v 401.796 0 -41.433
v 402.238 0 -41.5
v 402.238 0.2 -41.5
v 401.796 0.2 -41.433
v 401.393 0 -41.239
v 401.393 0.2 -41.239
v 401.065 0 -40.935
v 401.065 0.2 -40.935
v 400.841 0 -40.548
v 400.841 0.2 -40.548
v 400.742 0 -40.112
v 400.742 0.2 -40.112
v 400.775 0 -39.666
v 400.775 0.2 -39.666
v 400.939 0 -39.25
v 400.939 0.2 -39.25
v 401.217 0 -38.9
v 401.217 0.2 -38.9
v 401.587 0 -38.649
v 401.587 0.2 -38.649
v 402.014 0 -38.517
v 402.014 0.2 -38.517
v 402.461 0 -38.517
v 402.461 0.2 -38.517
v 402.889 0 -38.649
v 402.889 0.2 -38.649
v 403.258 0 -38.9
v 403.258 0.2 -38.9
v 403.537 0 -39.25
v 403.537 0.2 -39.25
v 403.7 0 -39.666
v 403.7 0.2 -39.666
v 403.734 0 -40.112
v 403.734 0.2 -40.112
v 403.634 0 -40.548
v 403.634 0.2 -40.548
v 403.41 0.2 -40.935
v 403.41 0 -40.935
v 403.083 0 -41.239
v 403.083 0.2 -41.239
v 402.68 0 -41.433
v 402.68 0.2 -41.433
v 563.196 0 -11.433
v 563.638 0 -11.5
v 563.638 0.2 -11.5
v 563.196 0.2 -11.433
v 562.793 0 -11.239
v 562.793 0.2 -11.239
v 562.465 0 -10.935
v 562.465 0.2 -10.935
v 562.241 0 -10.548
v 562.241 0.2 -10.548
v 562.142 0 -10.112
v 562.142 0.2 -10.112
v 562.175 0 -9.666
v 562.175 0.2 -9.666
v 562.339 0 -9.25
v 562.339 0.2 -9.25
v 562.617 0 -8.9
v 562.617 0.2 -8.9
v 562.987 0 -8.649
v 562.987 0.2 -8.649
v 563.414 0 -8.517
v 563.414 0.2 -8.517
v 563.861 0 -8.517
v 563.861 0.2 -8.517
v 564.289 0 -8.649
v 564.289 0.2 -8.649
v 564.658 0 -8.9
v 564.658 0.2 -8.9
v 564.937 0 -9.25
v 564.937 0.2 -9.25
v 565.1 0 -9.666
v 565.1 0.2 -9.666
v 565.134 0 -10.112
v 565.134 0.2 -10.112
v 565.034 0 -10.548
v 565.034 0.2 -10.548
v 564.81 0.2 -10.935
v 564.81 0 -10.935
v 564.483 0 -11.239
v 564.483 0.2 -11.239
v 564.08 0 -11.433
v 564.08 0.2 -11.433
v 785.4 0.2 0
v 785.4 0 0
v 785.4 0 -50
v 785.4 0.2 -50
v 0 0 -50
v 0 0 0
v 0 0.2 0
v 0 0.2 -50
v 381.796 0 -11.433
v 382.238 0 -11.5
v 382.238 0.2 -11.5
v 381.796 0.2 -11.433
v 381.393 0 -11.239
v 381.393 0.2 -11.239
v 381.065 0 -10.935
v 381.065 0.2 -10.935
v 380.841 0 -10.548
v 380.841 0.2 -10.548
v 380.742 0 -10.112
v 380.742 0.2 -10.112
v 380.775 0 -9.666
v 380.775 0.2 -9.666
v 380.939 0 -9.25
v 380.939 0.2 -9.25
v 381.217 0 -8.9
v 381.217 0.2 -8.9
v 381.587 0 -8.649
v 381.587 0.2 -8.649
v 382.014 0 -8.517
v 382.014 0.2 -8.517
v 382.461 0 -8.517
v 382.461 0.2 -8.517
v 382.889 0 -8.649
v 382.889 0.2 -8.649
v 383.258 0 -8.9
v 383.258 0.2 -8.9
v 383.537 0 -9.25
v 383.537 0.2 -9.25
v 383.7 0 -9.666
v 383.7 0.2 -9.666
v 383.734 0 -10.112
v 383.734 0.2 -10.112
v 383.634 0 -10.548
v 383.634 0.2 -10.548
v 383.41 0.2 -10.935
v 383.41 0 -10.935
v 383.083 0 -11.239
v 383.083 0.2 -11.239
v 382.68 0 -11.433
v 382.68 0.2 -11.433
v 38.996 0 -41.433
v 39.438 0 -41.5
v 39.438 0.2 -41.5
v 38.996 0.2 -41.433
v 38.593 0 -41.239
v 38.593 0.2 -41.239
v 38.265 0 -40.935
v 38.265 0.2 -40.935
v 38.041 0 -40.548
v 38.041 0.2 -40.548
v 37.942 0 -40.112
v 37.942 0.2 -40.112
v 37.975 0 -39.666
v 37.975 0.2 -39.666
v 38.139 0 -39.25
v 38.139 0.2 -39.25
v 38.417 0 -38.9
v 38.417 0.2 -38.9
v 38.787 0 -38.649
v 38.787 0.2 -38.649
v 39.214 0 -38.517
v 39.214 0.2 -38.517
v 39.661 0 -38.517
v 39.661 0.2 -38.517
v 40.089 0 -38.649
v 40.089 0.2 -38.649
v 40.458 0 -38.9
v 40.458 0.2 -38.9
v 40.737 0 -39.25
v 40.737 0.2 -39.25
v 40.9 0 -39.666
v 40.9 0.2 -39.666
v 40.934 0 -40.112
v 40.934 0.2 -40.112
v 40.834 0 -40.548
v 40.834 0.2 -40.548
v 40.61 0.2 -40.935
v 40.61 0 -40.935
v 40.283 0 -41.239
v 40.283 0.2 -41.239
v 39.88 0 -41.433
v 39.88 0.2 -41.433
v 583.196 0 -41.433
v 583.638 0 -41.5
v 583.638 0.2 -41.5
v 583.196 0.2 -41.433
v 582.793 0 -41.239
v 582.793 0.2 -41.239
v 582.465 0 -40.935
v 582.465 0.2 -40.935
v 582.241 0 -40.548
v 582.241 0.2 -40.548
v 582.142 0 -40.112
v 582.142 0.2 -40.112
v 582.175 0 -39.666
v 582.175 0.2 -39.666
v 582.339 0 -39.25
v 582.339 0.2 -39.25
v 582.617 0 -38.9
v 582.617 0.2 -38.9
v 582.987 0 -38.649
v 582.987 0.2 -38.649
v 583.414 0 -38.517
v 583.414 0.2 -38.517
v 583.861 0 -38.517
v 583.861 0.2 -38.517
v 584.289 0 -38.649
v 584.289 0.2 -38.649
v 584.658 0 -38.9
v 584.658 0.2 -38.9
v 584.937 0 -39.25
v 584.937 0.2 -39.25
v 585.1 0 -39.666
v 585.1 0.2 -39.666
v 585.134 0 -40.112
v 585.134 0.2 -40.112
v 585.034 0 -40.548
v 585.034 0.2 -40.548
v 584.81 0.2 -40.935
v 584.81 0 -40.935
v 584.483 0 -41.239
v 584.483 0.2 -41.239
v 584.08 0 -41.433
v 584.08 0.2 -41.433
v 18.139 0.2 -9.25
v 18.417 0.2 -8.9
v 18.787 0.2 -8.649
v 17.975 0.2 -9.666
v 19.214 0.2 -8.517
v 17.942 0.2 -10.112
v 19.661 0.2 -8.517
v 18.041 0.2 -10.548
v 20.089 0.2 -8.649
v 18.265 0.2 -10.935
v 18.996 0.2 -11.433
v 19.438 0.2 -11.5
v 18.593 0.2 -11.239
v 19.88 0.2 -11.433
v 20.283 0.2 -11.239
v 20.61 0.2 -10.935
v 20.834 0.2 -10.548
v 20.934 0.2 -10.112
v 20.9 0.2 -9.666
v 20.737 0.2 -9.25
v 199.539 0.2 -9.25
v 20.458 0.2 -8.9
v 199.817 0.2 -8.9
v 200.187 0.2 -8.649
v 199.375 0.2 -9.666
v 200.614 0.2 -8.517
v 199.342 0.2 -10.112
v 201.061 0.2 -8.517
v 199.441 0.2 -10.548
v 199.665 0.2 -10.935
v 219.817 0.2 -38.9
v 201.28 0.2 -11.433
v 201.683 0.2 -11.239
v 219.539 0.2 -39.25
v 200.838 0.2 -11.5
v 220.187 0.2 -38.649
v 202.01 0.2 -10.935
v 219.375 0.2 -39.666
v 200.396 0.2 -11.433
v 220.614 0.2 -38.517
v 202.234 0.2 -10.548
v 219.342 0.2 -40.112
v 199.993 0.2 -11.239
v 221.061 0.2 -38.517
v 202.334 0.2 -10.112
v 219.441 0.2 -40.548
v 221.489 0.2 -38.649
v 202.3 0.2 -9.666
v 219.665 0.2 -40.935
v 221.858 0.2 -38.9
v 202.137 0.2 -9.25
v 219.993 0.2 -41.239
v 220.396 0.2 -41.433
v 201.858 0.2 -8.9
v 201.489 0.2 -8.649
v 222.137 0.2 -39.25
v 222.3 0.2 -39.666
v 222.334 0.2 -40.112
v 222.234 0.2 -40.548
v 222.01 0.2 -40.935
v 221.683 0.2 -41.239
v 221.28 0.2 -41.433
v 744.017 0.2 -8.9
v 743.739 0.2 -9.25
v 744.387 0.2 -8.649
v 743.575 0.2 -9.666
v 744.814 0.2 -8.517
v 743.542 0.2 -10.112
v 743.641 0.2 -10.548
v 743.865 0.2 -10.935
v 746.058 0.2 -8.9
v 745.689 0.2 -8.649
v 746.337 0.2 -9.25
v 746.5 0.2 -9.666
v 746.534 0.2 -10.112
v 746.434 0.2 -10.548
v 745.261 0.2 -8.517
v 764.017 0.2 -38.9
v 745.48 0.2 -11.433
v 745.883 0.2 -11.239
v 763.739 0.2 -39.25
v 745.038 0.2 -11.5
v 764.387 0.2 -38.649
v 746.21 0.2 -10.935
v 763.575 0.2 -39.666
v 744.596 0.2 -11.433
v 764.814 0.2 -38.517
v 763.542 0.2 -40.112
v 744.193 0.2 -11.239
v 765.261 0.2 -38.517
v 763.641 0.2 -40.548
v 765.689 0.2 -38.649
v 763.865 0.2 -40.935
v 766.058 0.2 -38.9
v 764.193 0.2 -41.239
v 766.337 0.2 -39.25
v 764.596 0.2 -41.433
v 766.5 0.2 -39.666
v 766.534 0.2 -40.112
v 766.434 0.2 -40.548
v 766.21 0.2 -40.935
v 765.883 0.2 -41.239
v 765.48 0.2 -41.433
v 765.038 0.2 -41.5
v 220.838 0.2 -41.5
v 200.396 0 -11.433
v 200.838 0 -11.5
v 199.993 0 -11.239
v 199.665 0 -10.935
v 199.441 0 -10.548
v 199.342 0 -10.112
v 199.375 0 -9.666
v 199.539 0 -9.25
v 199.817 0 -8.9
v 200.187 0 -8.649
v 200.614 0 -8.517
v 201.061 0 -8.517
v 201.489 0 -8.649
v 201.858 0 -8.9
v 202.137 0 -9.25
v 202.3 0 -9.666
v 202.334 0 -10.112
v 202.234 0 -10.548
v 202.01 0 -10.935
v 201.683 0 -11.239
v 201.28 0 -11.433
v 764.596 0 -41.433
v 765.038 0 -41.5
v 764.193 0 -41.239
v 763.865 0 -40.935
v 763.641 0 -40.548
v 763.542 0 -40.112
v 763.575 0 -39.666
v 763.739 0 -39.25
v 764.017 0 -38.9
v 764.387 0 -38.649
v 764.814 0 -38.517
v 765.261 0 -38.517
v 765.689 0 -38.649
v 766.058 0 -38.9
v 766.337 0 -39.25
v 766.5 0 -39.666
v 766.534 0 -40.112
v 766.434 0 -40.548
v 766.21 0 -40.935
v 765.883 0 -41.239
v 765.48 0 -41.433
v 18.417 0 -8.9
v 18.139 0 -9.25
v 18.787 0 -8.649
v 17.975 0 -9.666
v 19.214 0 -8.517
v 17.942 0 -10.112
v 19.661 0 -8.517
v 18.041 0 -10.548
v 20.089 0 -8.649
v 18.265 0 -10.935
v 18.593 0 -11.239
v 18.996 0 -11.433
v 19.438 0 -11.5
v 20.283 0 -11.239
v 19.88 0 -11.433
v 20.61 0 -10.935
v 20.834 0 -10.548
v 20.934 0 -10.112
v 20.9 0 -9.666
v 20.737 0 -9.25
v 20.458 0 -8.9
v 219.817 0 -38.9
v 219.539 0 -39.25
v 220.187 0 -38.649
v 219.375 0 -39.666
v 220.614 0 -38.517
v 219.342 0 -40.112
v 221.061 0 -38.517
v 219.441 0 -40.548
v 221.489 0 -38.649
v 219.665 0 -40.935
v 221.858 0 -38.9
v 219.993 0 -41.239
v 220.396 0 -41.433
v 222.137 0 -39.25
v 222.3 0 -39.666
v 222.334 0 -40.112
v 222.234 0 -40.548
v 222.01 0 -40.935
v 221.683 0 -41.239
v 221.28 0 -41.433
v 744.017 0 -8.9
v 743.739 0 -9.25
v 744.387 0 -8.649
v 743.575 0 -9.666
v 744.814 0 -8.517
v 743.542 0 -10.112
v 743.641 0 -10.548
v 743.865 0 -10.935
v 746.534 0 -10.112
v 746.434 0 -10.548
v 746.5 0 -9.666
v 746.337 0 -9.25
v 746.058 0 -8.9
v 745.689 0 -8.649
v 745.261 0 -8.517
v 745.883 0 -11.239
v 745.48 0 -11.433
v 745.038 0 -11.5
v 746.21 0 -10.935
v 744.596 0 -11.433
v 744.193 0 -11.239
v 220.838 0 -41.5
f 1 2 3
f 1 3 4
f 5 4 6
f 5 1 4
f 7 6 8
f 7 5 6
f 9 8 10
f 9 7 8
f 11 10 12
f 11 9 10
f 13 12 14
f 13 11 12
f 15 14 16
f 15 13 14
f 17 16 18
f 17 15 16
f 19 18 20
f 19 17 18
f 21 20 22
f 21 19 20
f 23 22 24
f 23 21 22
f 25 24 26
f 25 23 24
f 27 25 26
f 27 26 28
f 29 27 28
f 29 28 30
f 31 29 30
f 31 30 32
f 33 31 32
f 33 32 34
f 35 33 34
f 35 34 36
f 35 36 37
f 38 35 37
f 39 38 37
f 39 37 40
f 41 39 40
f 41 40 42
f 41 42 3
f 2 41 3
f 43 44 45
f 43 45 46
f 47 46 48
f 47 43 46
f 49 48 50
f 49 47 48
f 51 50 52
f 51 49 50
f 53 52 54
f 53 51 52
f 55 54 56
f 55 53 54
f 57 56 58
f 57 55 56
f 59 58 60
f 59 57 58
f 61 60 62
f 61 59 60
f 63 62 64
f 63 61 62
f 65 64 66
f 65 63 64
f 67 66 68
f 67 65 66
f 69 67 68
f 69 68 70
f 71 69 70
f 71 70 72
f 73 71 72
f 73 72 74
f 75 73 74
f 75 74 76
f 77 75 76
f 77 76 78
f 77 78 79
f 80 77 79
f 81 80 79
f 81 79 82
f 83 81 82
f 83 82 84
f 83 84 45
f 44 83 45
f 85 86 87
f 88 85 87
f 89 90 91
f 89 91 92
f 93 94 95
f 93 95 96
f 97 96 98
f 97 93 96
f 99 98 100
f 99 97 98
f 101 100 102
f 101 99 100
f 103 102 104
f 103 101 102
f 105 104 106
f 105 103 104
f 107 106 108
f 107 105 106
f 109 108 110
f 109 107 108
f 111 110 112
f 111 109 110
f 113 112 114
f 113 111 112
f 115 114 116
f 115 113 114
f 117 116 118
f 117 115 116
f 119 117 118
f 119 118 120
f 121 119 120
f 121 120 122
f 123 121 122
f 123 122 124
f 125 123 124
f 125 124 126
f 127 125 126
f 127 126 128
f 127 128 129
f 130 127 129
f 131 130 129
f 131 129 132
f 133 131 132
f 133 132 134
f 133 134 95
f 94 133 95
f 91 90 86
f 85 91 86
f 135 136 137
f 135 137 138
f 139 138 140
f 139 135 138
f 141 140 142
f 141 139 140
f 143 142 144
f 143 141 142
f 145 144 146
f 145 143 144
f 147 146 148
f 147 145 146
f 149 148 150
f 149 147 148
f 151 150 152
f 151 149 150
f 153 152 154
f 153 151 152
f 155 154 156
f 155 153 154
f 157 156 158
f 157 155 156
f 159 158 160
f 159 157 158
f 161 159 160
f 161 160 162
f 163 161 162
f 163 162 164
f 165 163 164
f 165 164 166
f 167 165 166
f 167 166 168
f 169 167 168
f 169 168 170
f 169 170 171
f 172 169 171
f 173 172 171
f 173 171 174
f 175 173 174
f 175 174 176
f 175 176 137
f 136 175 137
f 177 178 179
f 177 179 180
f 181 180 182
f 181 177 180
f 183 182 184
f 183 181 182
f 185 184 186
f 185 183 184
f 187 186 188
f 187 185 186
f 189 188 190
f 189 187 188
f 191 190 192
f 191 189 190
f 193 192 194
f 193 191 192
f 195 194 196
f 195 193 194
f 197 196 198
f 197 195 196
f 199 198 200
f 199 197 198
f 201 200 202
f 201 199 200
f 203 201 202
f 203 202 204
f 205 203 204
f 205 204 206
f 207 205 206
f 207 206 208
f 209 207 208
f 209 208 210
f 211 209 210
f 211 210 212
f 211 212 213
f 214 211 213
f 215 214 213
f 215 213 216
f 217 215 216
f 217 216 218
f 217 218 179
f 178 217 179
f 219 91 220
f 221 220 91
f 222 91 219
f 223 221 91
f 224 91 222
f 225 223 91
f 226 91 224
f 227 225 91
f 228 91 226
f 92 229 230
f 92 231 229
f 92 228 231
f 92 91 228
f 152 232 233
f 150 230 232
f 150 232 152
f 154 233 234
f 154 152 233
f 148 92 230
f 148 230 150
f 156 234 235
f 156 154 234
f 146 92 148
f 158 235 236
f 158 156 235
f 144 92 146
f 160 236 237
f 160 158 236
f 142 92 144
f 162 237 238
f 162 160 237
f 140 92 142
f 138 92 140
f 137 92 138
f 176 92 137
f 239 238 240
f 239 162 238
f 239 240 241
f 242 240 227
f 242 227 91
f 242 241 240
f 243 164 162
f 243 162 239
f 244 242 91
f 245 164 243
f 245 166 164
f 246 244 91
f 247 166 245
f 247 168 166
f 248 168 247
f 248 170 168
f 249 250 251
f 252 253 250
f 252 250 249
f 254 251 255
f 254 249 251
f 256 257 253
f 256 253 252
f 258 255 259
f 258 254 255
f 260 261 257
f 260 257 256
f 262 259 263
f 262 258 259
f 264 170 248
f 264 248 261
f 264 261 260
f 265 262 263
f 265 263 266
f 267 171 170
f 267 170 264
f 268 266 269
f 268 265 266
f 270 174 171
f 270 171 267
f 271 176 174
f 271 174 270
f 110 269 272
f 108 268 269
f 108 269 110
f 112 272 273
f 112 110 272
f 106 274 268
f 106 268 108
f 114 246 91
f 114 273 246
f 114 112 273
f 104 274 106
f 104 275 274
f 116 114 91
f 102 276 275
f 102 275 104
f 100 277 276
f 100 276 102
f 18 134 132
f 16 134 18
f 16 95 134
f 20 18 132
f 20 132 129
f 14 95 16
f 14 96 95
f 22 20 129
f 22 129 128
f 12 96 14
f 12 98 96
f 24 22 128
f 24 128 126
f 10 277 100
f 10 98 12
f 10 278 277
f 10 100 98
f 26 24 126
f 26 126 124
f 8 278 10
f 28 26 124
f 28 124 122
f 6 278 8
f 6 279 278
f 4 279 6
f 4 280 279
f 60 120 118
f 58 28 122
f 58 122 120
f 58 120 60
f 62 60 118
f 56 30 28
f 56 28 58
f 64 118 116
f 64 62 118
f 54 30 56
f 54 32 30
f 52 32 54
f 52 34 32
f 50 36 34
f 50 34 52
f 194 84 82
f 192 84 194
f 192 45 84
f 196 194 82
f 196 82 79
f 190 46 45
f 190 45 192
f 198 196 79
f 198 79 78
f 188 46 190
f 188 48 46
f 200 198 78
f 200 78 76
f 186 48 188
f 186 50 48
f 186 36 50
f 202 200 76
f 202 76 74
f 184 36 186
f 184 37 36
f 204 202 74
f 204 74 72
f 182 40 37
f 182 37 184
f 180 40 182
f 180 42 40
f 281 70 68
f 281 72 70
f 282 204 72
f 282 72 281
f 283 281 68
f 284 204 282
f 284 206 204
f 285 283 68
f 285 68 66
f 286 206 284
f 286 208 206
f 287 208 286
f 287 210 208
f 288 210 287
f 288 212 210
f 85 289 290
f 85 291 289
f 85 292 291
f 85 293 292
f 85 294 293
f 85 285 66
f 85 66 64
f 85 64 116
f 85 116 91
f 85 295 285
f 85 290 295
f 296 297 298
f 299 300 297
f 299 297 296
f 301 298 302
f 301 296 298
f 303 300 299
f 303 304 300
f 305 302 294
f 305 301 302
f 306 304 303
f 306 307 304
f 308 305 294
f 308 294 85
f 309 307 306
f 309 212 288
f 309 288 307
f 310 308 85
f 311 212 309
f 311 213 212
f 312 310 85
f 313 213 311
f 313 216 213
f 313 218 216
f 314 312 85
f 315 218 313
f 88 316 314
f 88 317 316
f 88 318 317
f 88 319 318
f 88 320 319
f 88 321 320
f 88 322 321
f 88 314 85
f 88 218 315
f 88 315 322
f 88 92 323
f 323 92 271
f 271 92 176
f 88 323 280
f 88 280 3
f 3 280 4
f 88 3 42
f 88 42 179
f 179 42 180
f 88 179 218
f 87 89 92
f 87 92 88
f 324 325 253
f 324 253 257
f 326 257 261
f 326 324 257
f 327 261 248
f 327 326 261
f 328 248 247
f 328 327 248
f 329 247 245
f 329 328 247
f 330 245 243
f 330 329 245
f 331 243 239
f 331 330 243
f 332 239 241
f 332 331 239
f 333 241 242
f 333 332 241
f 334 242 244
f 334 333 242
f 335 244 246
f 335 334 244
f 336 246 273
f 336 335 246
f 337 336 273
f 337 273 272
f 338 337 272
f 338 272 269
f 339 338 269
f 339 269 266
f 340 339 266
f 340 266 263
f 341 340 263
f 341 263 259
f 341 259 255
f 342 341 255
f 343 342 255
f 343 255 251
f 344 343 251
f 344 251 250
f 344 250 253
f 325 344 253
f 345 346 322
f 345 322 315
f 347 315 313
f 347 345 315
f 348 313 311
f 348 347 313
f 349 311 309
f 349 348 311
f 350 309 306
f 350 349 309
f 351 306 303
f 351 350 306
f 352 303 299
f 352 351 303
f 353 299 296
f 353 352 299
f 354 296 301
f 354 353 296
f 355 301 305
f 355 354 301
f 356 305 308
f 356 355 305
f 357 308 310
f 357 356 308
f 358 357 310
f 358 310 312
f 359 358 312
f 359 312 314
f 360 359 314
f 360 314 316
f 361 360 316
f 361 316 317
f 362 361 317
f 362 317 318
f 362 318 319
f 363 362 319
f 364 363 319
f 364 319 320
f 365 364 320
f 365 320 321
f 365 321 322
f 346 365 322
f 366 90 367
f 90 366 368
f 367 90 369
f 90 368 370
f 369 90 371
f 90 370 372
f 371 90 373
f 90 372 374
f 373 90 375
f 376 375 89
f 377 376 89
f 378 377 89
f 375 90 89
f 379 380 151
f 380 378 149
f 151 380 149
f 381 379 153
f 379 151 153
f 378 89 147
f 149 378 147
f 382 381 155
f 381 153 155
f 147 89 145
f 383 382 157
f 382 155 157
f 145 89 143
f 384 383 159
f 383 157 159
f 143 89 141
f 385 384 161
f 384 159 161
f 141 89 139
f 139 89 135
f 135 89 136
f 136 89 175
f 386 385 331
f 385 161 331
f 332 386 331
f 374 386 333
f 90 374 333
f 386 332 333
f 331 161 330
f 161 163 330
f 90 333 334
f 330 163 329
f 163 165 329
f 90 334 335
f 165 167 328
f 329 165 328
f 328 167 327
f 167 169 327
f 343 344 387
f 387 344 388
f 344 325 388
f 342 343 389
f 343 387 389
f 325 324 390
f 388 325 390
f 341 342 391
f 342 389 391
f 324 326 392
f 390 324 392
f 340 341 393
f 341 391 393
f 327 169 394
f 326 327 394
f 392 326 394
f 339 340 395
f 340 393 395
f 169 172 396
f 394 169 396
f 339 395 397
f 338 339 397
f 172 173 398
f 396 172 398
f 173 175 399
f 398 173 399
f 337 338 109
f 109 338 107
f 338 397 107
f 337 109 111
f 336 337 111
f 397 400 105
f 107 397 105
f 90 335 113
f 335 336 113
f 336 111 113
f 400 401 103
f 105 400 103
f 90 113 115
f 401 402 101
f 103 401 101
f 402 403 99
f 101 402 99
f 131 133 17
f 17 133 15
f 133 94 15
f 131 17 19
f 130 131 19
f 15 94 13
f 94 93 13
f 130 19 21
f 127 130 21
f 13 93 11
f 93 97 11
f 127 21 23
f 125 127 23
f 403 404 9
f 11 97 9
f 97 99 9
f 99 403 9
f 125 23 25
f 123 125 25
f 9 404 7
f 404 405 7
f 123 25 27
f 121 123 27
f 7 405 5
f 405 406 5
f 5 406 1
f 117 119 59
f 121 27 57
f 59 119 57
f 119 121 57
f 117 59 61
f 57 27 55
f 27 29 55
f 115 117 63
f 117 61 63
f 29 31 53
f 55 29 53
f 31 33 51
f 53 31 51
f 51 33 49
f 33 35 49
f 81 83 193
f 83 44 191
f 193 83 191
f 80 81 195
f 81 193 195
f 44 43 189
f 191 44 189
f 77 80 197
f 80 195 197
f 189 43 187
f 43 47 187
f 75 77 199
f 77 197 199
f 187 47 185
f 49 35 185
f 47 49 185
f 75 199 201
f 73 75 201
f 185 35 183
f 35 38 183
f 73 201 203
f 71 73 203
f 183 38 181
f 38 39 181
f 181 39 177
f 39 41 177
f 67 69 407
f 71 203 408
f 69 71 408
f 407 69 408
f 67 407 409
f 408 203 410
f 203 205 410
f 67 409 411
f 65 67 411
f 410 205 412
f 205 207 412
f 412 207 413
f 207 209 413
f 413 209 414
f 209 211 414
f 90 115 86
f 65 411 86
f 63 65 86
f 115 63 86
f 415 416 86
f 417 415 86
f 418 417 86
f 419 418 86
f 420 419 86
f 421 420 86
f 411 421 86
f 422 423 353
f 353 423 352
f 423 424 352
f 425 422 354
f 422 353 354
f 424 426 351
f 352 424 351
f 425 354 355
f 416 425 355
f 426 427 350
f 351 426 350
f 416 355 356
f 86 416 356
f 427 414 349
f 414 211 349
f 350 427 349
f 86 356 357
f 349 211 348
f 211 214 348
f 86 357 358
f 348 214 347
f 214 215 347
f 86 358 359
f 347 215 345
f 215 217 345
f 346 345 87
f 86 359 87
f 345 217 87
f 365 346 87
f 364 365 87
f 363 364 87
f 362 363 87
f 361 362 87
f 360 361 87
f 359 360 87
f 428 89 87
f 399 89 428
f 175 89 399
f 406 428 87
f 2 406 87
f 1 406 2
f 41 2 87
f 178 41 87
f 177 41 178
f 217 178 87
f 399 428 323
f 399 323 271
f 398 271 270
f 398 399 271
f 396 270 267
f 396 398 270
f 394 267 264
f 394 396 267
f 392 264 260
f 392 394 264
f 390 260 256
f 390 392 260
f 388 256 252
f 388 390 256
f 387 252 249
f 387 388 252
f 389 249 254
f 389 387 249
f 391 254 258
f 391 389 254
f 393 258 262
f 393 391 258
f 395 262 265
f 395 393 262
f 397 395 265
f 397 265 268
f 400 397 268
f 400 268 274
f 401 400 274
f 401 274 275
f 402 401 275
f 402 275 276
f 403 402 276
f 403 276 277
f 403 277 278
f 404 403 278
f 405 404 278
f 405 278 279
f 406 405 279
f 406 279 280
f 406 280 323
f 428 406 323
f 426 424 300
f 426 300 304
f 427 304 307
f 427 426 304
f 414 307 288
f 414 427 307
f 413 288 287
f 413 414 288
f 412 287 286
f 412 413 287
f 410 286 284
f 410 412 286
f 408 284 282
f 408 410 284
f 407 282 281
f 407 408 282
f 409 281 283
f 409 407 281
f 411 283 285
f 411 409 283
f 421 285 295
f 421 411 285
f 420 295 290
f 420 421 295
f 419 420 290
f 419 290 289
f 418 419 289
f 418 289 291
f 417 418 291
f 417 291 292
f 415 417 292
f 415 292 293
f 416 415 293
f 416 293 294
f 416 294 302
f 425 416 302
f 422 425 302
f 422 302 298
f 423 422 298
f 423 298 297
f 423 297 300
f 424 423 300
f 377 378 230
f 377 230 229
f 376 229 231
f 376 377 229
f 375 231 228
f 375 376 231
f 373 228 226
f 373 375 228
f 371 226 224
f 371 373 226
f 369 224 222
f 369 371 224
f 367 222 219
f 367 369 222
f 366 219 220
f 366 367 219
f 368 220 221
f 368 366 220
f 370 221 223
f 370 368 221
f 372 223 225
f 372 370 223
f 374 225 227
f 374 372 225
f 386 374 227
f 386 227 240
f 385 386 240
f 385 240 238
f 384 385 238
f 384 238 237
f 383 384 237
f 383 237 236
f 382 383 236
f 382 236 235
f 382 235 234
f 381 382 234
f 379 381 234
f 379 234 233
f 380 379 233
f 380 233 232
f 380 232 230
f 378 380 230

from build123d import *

# Parameters (mm, degrees)
SKETCH1_W               = 785.4
SKETCH1_H               = 50
BOSS_EXTRUDE1_DEPTH     = 0.2
CUT_EXTRUDE1_DEPTH      = 0.2
CUT_EXTRUDE1_DEPTH_BACK = 0.2
SKETCH2_R               = 1.5


with BuildPart() as part:
    # Sketch1 → Boss-Extrude1 (new body)
    with BuildSketch(Plane(origin=(0, 0, 0), x_dir=(1, 0, 0), z_dir=(0, 1, 0))):
        with Locations((392.7, 25)):
            Rectangle(SKETCH1_W, SKETCH1_H)
    extrude(amount=BOSS_EXTRUDE1_DEPTH)

    # Sketch2 → Cut-Extrude1 (cut, two sides: drawn at the far end of the back side and taken through both)
    with BuildSketch(Plane(origin=(0, 0, 0), x_dir=(1, 0, 0), z_dir=(0, 1, 0)).offset(-CUT_EXTRUDE1_DEPTH_BACK)):
        with Locations((19.437732804, 10)):
            Circle(SKETCH2_R)
        with Locations((39.437732804, 40)):
            Circle(SKETCH2_R)
        with Locations((200.837732804, 10)):
            Circle(SKETCH2_R)
        with Locations((220.837732804, 40)):
            Circle(SKETCH2_R)
        with Locations((382.237732804, 10)):
            Circle(SKETCH2_R)
        with Locations((402.237732804, 40)):
            Circle(SKETCH2_R)
        with Locations((563.637732804, 10)):
            Circle(SKETCH2_R)
        with Locations((583.637732804, 40)):
            Circle(SKETCH2_R)
        with Locations((745.037732804, 10)):
            Circle(SKETCH2_R)
        with Locations((765.037732804, 40)):
            Circle(SKETCH2_R)
    extrude(amount=CUT_EXTRUDE1_DEPTH + CUT_EXTRUDE1_DEPTH_BACK, mode=Mode.SUBTRACT)


solid = part.part
